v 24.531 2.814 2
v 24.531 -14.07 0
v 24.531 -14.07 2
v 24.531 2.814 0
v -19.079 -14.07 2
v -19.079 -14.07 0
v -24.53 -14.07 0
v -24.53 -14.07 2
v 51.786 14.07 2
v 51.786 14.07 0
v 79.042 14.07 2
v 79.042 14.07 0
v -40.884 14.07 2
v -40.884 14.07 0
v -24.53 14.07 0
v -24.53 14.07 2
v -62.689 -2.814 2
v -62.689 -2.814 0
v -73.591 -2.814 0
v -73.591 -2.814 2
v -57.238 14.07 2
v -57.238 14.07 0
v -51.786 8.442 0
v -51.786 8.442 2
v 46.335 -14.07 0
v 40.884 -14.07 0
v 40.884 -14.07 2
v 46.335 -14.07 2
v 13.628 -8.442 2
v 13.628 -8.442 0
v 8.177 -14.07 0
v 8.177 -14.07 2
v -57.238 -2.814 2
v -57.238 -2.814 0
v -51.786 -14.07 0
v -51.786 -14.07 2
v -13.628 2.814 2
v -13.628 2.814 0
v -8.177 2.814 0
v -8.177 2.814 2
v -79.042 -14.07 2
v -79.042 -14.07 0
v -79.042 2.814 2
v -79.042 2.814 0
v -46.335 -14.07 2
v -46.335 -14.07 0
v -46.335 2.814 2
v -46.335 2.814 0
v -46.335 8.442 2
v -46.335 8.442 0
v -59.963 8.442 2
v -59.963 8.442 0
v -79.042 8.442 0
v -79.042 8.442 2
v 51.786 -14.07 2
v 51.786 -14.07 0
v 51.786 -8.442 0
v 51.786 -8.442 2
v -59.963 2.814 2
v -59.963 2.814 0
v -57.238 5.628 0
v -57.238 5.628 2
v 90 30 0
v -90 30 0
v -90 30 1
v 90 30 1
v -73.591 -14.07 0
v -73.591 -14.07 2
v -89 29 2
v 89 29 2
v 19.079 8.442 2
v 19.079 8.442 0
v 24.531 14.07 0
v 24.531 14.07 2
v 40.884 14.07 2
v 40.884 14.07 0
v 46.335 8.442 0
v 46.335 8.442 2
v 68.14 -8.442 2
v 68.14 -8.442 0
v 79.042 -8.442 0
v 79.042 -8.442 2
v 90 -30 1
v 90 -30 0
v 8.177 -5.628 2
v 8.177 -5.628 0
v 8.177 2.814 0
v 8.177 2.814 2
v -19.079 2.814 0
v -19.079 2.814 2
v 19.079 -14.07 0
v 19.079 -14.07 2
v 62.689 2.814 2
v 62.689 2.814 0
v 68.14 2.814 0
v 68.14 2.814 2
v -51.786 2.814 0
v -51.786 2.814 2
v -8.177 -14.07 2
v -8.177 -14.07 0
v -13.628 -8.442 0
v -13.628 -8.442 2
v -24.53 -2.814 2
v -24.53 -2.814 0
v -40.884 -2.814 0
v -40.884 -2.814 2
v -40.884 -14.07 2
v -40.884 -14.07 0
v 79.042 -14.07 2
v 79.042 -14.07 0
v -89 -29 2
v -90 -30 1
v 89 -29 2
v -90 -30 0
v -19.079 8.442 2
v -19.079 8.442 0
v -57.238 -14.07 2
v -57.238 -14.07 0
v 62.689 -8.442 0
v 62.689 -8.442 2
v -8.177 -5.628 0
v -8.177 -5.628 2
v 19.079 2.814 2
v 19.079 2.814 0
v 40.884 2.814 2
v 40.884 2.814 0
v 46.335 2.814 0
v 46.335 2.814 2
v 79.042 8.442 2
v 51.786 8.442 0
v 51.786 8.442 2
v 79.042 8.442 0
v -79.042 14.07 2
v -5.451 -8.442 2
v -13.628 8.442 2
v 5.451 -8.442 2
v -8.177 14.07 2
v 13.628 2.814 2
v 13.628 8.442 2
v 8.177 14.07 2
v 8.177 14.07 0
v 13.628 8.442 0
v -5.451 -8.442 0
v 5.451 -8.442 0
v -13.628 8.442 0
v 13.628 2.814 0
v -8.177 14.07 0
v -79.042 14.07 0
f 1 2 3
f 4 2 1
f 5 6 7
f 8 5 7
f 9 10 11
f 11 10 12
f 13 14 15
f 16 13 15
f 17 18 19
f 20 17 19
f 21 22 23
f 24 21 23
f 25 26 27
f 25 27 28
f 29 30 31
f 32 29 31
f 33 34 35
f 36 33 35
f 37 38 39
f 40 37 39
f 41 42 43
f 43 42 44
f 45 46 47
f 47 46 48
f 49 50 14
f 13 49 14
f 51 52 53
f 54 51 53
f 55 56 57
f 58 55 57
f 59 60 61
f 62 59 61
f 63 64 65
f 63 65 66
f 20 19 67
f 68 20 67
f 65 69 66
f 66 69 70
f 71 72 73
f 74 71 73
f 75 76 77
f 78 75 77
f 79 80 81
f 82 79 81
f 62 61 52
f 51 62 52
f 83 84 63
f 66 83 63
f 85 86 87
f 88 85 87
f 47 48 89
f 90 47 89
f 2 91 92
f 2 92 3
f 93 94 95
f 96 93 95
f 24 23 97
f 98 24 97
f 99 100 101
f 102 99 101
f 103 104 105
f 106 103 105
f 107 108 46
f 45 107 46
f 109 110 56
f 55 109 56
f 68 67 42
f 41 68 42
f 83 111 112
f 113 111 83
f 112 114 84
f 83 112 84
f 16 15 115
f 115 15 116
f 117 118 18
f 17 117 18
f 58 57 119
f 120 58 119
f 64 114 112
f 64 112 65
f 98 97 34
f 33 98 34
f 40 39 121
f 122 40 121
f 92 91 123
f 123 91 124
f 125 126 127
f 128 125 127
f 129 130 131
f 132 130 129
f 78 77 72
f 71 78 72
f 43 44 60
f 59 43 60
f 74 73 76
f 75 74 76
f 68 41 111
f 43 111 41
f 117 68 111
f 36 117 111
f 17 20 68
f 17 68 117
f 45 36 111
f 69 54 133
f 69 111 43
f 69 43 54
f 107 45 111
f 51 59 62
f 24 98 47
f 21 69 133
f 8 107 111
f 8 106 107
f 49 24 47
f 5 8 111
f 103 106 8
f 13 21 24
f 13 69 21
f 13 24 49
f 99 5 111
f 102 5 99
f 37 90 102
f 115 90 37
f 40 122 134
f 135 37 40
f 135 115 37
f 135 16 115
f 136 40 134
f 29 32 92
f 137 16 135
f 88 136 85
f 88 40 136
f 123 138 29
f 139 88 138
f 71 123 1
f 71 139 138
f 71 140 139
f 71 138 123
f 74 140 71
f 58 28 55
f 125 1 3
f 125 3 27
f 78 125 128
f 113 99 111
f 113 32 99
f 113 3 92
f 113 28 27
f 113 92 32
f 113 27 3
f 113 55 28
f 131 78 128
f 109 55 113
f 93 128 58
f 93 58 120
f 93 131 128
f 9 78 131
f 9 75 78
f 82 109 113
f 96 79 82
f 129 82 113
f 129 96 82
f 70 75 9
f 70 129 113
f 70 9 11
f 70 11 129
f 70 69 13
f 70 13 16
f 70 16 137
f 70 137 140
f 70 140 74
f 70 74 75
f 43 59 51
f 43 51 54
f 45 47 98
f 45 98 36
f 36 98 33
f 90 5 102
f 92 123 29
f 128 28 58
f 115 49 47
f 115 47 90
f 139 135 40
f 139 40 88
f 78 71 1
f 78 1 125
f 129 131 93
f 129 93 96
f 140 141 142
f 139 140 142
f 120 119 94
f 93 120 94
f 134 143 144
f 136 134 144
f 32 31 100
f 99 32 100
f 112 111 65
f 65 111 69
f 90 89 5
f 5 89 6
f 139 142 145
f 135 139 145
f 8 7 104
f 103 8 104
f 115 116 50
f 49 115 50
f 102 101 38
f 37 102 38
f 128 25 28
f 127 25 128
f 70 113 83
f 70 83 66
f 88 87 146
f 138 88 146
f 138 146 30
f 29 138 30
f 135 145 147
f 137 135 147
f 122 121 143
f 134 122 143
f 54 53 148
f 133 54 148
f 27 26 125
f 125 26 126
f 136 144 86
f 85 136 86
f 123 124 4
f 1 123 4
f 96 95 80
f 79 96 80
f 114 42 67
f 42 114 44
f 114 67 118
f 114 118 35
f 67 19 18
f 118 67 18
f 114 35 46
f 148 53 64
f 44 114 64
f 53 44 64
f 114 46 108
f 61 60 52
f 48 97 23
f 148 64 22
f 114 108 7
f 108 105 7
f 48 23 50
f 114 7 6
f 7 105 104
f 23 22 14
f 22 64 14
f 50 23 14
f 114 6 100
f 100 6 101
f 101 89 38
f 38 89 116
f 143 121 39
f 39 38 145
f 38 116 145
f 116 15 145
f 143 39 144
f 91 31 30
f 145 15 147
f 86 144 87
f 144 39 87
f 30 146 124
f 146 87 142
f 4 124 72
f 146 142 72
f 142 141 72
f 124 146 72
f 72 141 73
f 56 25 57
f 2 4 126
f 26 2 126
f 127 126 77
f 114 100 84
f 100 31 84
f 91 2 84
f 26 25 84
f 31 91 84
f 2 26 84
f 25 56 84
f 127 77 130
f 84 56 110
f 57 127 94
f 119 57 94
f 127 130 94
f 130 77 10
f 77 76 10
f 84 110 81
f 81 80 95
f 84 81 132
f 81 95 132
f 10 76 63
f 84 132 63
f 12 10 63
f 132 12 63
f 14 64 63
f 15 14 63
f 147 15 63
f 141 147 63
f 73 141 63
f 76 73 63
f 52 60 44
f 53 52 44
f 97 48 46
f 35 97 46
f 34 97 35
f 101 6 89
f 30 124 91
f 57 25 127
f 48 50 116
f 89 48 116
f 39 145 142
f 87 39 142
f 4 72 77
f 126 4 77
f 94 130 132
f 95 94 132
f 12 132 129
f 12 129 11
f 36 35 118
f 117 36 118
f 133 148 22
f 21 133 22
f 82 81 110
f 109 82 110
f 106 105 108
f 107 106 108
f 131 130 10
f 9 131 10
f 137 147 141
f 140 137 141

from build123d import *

# Parameters (mm, degrees)
F1_W     = 180
F1_H     = 60
F1_W_2   = 5.451307
F1_H_2   = 16.88455
F1_W_3   = 5.450975
F1_W_4   = 27.255869
F1_H_3   = 5.628183
F2_DEPTH = 2
F3_SIZE  = 1


with BuildPart() as f2:
    # F1 (on Top) → F2 (new body)
    with BuildSketch(Plane.XY):
        Rectangle(F1_W, F1_H)
        Polygon((-40.883972, -14.070458), (-46.335113, -14.070458), (-46.335113, 2.814092), (-19.079077, 2.814092), (-19.079077, -14.070458), (-24.530383, -14.070458), (-24.530383, -2.814092), (-40.883972, -2.814092), align=None, mode=Mode.SUBTRACT)
        Polygon((5.451141, -8.442275), (8.17696, -5.628183), (8.17696, 2.814092), (13.627935, 2.814092), (13.627935, -8.442275), (8.17696, -14.070458), (-8.176628, -14.070458), (-13.627936, -8.442275), (-13.627936, 2.814092), (-8.176628, 2.814092), (-8.176628, -5.628183), (-5.451141, -8.442275), align=None, mode=Mode.SUBTRACT)
        with Locations((21.804896, -5.628183)):
            Rectangle(F1_W_2, F1_H_2, mode=Mode.SUBTRACT)
        with Locations((43.609624, -5.628183)):
            Rectangle(F1_W_3, F1_H_2, mode=Mode.SUBTRACT)
        Polygon((62.688701, 2.814092), (68.140008, 2.814092), (68.140008, -8.442275), (79.042289, -8.442275), (79.042289, -14.070458), (51.78642, -14.070458), (51.78642, -8.442275), (62.688701, -8.442275), align=None, mode=Mode.SUBTRACT)
        Polygon((-79.04229, 8.442275), (-79.04229, 14.070458), (-57.23756, 14.070458), (-51.786254, 8.442275), (-51.786254, 2.814092), (-57.23756, -2.814092), (-51.786254, -14.070458), (-57.23756, -14.070458), (-62.688701, -2.814092), (-73.591149, -2.814092), (-73.591149, -14.070458), (-79.04229, -14.070458), (-79.04229, 2.814092), (-59.963048, 2.814092), (-57.23756, 5.628183), (-59.963048, 8.442275), align=None, mode=Mode.SUBTRACT)
        Polygon((-46.335113, 8.442275), (-40.883972, 14.070458), (-24.530383, 14.070458), (-19.079077, 8.442275), align=None, mode=Mode.SUBTRACT)
        Polygon((-13.627936, 8.442275), (-8.176628, 14.070458), (8.17696, 14.070458), (13.627935, 8.442275), align=None, mode=Mode.SUBTRACT)
        Polygon((19.079242, 8.442275), (24.530549, 14.070458), (40.884137, 14.070458), (46.335112, 8.442275), align=None, mode=Mode.SUBTRACT)
        with Locations((65.414355, 11.256366)):
            Rectangle(F1_W_4, F1_H_3, mode=Mode.SUBTRACT)
    extrude(amount=F2_DEPTH)

    # F3
    f3_edges = [f2.edges().sort_by_distance(p)[0] for p in [
        (0, 30, 2),
        (0, -30, 2),
        (90, 0, 2),
        (-90, 0, 2),
    ]]
    chamfer(f3_edges, length=F3_SIZE)


solid = f2.part
